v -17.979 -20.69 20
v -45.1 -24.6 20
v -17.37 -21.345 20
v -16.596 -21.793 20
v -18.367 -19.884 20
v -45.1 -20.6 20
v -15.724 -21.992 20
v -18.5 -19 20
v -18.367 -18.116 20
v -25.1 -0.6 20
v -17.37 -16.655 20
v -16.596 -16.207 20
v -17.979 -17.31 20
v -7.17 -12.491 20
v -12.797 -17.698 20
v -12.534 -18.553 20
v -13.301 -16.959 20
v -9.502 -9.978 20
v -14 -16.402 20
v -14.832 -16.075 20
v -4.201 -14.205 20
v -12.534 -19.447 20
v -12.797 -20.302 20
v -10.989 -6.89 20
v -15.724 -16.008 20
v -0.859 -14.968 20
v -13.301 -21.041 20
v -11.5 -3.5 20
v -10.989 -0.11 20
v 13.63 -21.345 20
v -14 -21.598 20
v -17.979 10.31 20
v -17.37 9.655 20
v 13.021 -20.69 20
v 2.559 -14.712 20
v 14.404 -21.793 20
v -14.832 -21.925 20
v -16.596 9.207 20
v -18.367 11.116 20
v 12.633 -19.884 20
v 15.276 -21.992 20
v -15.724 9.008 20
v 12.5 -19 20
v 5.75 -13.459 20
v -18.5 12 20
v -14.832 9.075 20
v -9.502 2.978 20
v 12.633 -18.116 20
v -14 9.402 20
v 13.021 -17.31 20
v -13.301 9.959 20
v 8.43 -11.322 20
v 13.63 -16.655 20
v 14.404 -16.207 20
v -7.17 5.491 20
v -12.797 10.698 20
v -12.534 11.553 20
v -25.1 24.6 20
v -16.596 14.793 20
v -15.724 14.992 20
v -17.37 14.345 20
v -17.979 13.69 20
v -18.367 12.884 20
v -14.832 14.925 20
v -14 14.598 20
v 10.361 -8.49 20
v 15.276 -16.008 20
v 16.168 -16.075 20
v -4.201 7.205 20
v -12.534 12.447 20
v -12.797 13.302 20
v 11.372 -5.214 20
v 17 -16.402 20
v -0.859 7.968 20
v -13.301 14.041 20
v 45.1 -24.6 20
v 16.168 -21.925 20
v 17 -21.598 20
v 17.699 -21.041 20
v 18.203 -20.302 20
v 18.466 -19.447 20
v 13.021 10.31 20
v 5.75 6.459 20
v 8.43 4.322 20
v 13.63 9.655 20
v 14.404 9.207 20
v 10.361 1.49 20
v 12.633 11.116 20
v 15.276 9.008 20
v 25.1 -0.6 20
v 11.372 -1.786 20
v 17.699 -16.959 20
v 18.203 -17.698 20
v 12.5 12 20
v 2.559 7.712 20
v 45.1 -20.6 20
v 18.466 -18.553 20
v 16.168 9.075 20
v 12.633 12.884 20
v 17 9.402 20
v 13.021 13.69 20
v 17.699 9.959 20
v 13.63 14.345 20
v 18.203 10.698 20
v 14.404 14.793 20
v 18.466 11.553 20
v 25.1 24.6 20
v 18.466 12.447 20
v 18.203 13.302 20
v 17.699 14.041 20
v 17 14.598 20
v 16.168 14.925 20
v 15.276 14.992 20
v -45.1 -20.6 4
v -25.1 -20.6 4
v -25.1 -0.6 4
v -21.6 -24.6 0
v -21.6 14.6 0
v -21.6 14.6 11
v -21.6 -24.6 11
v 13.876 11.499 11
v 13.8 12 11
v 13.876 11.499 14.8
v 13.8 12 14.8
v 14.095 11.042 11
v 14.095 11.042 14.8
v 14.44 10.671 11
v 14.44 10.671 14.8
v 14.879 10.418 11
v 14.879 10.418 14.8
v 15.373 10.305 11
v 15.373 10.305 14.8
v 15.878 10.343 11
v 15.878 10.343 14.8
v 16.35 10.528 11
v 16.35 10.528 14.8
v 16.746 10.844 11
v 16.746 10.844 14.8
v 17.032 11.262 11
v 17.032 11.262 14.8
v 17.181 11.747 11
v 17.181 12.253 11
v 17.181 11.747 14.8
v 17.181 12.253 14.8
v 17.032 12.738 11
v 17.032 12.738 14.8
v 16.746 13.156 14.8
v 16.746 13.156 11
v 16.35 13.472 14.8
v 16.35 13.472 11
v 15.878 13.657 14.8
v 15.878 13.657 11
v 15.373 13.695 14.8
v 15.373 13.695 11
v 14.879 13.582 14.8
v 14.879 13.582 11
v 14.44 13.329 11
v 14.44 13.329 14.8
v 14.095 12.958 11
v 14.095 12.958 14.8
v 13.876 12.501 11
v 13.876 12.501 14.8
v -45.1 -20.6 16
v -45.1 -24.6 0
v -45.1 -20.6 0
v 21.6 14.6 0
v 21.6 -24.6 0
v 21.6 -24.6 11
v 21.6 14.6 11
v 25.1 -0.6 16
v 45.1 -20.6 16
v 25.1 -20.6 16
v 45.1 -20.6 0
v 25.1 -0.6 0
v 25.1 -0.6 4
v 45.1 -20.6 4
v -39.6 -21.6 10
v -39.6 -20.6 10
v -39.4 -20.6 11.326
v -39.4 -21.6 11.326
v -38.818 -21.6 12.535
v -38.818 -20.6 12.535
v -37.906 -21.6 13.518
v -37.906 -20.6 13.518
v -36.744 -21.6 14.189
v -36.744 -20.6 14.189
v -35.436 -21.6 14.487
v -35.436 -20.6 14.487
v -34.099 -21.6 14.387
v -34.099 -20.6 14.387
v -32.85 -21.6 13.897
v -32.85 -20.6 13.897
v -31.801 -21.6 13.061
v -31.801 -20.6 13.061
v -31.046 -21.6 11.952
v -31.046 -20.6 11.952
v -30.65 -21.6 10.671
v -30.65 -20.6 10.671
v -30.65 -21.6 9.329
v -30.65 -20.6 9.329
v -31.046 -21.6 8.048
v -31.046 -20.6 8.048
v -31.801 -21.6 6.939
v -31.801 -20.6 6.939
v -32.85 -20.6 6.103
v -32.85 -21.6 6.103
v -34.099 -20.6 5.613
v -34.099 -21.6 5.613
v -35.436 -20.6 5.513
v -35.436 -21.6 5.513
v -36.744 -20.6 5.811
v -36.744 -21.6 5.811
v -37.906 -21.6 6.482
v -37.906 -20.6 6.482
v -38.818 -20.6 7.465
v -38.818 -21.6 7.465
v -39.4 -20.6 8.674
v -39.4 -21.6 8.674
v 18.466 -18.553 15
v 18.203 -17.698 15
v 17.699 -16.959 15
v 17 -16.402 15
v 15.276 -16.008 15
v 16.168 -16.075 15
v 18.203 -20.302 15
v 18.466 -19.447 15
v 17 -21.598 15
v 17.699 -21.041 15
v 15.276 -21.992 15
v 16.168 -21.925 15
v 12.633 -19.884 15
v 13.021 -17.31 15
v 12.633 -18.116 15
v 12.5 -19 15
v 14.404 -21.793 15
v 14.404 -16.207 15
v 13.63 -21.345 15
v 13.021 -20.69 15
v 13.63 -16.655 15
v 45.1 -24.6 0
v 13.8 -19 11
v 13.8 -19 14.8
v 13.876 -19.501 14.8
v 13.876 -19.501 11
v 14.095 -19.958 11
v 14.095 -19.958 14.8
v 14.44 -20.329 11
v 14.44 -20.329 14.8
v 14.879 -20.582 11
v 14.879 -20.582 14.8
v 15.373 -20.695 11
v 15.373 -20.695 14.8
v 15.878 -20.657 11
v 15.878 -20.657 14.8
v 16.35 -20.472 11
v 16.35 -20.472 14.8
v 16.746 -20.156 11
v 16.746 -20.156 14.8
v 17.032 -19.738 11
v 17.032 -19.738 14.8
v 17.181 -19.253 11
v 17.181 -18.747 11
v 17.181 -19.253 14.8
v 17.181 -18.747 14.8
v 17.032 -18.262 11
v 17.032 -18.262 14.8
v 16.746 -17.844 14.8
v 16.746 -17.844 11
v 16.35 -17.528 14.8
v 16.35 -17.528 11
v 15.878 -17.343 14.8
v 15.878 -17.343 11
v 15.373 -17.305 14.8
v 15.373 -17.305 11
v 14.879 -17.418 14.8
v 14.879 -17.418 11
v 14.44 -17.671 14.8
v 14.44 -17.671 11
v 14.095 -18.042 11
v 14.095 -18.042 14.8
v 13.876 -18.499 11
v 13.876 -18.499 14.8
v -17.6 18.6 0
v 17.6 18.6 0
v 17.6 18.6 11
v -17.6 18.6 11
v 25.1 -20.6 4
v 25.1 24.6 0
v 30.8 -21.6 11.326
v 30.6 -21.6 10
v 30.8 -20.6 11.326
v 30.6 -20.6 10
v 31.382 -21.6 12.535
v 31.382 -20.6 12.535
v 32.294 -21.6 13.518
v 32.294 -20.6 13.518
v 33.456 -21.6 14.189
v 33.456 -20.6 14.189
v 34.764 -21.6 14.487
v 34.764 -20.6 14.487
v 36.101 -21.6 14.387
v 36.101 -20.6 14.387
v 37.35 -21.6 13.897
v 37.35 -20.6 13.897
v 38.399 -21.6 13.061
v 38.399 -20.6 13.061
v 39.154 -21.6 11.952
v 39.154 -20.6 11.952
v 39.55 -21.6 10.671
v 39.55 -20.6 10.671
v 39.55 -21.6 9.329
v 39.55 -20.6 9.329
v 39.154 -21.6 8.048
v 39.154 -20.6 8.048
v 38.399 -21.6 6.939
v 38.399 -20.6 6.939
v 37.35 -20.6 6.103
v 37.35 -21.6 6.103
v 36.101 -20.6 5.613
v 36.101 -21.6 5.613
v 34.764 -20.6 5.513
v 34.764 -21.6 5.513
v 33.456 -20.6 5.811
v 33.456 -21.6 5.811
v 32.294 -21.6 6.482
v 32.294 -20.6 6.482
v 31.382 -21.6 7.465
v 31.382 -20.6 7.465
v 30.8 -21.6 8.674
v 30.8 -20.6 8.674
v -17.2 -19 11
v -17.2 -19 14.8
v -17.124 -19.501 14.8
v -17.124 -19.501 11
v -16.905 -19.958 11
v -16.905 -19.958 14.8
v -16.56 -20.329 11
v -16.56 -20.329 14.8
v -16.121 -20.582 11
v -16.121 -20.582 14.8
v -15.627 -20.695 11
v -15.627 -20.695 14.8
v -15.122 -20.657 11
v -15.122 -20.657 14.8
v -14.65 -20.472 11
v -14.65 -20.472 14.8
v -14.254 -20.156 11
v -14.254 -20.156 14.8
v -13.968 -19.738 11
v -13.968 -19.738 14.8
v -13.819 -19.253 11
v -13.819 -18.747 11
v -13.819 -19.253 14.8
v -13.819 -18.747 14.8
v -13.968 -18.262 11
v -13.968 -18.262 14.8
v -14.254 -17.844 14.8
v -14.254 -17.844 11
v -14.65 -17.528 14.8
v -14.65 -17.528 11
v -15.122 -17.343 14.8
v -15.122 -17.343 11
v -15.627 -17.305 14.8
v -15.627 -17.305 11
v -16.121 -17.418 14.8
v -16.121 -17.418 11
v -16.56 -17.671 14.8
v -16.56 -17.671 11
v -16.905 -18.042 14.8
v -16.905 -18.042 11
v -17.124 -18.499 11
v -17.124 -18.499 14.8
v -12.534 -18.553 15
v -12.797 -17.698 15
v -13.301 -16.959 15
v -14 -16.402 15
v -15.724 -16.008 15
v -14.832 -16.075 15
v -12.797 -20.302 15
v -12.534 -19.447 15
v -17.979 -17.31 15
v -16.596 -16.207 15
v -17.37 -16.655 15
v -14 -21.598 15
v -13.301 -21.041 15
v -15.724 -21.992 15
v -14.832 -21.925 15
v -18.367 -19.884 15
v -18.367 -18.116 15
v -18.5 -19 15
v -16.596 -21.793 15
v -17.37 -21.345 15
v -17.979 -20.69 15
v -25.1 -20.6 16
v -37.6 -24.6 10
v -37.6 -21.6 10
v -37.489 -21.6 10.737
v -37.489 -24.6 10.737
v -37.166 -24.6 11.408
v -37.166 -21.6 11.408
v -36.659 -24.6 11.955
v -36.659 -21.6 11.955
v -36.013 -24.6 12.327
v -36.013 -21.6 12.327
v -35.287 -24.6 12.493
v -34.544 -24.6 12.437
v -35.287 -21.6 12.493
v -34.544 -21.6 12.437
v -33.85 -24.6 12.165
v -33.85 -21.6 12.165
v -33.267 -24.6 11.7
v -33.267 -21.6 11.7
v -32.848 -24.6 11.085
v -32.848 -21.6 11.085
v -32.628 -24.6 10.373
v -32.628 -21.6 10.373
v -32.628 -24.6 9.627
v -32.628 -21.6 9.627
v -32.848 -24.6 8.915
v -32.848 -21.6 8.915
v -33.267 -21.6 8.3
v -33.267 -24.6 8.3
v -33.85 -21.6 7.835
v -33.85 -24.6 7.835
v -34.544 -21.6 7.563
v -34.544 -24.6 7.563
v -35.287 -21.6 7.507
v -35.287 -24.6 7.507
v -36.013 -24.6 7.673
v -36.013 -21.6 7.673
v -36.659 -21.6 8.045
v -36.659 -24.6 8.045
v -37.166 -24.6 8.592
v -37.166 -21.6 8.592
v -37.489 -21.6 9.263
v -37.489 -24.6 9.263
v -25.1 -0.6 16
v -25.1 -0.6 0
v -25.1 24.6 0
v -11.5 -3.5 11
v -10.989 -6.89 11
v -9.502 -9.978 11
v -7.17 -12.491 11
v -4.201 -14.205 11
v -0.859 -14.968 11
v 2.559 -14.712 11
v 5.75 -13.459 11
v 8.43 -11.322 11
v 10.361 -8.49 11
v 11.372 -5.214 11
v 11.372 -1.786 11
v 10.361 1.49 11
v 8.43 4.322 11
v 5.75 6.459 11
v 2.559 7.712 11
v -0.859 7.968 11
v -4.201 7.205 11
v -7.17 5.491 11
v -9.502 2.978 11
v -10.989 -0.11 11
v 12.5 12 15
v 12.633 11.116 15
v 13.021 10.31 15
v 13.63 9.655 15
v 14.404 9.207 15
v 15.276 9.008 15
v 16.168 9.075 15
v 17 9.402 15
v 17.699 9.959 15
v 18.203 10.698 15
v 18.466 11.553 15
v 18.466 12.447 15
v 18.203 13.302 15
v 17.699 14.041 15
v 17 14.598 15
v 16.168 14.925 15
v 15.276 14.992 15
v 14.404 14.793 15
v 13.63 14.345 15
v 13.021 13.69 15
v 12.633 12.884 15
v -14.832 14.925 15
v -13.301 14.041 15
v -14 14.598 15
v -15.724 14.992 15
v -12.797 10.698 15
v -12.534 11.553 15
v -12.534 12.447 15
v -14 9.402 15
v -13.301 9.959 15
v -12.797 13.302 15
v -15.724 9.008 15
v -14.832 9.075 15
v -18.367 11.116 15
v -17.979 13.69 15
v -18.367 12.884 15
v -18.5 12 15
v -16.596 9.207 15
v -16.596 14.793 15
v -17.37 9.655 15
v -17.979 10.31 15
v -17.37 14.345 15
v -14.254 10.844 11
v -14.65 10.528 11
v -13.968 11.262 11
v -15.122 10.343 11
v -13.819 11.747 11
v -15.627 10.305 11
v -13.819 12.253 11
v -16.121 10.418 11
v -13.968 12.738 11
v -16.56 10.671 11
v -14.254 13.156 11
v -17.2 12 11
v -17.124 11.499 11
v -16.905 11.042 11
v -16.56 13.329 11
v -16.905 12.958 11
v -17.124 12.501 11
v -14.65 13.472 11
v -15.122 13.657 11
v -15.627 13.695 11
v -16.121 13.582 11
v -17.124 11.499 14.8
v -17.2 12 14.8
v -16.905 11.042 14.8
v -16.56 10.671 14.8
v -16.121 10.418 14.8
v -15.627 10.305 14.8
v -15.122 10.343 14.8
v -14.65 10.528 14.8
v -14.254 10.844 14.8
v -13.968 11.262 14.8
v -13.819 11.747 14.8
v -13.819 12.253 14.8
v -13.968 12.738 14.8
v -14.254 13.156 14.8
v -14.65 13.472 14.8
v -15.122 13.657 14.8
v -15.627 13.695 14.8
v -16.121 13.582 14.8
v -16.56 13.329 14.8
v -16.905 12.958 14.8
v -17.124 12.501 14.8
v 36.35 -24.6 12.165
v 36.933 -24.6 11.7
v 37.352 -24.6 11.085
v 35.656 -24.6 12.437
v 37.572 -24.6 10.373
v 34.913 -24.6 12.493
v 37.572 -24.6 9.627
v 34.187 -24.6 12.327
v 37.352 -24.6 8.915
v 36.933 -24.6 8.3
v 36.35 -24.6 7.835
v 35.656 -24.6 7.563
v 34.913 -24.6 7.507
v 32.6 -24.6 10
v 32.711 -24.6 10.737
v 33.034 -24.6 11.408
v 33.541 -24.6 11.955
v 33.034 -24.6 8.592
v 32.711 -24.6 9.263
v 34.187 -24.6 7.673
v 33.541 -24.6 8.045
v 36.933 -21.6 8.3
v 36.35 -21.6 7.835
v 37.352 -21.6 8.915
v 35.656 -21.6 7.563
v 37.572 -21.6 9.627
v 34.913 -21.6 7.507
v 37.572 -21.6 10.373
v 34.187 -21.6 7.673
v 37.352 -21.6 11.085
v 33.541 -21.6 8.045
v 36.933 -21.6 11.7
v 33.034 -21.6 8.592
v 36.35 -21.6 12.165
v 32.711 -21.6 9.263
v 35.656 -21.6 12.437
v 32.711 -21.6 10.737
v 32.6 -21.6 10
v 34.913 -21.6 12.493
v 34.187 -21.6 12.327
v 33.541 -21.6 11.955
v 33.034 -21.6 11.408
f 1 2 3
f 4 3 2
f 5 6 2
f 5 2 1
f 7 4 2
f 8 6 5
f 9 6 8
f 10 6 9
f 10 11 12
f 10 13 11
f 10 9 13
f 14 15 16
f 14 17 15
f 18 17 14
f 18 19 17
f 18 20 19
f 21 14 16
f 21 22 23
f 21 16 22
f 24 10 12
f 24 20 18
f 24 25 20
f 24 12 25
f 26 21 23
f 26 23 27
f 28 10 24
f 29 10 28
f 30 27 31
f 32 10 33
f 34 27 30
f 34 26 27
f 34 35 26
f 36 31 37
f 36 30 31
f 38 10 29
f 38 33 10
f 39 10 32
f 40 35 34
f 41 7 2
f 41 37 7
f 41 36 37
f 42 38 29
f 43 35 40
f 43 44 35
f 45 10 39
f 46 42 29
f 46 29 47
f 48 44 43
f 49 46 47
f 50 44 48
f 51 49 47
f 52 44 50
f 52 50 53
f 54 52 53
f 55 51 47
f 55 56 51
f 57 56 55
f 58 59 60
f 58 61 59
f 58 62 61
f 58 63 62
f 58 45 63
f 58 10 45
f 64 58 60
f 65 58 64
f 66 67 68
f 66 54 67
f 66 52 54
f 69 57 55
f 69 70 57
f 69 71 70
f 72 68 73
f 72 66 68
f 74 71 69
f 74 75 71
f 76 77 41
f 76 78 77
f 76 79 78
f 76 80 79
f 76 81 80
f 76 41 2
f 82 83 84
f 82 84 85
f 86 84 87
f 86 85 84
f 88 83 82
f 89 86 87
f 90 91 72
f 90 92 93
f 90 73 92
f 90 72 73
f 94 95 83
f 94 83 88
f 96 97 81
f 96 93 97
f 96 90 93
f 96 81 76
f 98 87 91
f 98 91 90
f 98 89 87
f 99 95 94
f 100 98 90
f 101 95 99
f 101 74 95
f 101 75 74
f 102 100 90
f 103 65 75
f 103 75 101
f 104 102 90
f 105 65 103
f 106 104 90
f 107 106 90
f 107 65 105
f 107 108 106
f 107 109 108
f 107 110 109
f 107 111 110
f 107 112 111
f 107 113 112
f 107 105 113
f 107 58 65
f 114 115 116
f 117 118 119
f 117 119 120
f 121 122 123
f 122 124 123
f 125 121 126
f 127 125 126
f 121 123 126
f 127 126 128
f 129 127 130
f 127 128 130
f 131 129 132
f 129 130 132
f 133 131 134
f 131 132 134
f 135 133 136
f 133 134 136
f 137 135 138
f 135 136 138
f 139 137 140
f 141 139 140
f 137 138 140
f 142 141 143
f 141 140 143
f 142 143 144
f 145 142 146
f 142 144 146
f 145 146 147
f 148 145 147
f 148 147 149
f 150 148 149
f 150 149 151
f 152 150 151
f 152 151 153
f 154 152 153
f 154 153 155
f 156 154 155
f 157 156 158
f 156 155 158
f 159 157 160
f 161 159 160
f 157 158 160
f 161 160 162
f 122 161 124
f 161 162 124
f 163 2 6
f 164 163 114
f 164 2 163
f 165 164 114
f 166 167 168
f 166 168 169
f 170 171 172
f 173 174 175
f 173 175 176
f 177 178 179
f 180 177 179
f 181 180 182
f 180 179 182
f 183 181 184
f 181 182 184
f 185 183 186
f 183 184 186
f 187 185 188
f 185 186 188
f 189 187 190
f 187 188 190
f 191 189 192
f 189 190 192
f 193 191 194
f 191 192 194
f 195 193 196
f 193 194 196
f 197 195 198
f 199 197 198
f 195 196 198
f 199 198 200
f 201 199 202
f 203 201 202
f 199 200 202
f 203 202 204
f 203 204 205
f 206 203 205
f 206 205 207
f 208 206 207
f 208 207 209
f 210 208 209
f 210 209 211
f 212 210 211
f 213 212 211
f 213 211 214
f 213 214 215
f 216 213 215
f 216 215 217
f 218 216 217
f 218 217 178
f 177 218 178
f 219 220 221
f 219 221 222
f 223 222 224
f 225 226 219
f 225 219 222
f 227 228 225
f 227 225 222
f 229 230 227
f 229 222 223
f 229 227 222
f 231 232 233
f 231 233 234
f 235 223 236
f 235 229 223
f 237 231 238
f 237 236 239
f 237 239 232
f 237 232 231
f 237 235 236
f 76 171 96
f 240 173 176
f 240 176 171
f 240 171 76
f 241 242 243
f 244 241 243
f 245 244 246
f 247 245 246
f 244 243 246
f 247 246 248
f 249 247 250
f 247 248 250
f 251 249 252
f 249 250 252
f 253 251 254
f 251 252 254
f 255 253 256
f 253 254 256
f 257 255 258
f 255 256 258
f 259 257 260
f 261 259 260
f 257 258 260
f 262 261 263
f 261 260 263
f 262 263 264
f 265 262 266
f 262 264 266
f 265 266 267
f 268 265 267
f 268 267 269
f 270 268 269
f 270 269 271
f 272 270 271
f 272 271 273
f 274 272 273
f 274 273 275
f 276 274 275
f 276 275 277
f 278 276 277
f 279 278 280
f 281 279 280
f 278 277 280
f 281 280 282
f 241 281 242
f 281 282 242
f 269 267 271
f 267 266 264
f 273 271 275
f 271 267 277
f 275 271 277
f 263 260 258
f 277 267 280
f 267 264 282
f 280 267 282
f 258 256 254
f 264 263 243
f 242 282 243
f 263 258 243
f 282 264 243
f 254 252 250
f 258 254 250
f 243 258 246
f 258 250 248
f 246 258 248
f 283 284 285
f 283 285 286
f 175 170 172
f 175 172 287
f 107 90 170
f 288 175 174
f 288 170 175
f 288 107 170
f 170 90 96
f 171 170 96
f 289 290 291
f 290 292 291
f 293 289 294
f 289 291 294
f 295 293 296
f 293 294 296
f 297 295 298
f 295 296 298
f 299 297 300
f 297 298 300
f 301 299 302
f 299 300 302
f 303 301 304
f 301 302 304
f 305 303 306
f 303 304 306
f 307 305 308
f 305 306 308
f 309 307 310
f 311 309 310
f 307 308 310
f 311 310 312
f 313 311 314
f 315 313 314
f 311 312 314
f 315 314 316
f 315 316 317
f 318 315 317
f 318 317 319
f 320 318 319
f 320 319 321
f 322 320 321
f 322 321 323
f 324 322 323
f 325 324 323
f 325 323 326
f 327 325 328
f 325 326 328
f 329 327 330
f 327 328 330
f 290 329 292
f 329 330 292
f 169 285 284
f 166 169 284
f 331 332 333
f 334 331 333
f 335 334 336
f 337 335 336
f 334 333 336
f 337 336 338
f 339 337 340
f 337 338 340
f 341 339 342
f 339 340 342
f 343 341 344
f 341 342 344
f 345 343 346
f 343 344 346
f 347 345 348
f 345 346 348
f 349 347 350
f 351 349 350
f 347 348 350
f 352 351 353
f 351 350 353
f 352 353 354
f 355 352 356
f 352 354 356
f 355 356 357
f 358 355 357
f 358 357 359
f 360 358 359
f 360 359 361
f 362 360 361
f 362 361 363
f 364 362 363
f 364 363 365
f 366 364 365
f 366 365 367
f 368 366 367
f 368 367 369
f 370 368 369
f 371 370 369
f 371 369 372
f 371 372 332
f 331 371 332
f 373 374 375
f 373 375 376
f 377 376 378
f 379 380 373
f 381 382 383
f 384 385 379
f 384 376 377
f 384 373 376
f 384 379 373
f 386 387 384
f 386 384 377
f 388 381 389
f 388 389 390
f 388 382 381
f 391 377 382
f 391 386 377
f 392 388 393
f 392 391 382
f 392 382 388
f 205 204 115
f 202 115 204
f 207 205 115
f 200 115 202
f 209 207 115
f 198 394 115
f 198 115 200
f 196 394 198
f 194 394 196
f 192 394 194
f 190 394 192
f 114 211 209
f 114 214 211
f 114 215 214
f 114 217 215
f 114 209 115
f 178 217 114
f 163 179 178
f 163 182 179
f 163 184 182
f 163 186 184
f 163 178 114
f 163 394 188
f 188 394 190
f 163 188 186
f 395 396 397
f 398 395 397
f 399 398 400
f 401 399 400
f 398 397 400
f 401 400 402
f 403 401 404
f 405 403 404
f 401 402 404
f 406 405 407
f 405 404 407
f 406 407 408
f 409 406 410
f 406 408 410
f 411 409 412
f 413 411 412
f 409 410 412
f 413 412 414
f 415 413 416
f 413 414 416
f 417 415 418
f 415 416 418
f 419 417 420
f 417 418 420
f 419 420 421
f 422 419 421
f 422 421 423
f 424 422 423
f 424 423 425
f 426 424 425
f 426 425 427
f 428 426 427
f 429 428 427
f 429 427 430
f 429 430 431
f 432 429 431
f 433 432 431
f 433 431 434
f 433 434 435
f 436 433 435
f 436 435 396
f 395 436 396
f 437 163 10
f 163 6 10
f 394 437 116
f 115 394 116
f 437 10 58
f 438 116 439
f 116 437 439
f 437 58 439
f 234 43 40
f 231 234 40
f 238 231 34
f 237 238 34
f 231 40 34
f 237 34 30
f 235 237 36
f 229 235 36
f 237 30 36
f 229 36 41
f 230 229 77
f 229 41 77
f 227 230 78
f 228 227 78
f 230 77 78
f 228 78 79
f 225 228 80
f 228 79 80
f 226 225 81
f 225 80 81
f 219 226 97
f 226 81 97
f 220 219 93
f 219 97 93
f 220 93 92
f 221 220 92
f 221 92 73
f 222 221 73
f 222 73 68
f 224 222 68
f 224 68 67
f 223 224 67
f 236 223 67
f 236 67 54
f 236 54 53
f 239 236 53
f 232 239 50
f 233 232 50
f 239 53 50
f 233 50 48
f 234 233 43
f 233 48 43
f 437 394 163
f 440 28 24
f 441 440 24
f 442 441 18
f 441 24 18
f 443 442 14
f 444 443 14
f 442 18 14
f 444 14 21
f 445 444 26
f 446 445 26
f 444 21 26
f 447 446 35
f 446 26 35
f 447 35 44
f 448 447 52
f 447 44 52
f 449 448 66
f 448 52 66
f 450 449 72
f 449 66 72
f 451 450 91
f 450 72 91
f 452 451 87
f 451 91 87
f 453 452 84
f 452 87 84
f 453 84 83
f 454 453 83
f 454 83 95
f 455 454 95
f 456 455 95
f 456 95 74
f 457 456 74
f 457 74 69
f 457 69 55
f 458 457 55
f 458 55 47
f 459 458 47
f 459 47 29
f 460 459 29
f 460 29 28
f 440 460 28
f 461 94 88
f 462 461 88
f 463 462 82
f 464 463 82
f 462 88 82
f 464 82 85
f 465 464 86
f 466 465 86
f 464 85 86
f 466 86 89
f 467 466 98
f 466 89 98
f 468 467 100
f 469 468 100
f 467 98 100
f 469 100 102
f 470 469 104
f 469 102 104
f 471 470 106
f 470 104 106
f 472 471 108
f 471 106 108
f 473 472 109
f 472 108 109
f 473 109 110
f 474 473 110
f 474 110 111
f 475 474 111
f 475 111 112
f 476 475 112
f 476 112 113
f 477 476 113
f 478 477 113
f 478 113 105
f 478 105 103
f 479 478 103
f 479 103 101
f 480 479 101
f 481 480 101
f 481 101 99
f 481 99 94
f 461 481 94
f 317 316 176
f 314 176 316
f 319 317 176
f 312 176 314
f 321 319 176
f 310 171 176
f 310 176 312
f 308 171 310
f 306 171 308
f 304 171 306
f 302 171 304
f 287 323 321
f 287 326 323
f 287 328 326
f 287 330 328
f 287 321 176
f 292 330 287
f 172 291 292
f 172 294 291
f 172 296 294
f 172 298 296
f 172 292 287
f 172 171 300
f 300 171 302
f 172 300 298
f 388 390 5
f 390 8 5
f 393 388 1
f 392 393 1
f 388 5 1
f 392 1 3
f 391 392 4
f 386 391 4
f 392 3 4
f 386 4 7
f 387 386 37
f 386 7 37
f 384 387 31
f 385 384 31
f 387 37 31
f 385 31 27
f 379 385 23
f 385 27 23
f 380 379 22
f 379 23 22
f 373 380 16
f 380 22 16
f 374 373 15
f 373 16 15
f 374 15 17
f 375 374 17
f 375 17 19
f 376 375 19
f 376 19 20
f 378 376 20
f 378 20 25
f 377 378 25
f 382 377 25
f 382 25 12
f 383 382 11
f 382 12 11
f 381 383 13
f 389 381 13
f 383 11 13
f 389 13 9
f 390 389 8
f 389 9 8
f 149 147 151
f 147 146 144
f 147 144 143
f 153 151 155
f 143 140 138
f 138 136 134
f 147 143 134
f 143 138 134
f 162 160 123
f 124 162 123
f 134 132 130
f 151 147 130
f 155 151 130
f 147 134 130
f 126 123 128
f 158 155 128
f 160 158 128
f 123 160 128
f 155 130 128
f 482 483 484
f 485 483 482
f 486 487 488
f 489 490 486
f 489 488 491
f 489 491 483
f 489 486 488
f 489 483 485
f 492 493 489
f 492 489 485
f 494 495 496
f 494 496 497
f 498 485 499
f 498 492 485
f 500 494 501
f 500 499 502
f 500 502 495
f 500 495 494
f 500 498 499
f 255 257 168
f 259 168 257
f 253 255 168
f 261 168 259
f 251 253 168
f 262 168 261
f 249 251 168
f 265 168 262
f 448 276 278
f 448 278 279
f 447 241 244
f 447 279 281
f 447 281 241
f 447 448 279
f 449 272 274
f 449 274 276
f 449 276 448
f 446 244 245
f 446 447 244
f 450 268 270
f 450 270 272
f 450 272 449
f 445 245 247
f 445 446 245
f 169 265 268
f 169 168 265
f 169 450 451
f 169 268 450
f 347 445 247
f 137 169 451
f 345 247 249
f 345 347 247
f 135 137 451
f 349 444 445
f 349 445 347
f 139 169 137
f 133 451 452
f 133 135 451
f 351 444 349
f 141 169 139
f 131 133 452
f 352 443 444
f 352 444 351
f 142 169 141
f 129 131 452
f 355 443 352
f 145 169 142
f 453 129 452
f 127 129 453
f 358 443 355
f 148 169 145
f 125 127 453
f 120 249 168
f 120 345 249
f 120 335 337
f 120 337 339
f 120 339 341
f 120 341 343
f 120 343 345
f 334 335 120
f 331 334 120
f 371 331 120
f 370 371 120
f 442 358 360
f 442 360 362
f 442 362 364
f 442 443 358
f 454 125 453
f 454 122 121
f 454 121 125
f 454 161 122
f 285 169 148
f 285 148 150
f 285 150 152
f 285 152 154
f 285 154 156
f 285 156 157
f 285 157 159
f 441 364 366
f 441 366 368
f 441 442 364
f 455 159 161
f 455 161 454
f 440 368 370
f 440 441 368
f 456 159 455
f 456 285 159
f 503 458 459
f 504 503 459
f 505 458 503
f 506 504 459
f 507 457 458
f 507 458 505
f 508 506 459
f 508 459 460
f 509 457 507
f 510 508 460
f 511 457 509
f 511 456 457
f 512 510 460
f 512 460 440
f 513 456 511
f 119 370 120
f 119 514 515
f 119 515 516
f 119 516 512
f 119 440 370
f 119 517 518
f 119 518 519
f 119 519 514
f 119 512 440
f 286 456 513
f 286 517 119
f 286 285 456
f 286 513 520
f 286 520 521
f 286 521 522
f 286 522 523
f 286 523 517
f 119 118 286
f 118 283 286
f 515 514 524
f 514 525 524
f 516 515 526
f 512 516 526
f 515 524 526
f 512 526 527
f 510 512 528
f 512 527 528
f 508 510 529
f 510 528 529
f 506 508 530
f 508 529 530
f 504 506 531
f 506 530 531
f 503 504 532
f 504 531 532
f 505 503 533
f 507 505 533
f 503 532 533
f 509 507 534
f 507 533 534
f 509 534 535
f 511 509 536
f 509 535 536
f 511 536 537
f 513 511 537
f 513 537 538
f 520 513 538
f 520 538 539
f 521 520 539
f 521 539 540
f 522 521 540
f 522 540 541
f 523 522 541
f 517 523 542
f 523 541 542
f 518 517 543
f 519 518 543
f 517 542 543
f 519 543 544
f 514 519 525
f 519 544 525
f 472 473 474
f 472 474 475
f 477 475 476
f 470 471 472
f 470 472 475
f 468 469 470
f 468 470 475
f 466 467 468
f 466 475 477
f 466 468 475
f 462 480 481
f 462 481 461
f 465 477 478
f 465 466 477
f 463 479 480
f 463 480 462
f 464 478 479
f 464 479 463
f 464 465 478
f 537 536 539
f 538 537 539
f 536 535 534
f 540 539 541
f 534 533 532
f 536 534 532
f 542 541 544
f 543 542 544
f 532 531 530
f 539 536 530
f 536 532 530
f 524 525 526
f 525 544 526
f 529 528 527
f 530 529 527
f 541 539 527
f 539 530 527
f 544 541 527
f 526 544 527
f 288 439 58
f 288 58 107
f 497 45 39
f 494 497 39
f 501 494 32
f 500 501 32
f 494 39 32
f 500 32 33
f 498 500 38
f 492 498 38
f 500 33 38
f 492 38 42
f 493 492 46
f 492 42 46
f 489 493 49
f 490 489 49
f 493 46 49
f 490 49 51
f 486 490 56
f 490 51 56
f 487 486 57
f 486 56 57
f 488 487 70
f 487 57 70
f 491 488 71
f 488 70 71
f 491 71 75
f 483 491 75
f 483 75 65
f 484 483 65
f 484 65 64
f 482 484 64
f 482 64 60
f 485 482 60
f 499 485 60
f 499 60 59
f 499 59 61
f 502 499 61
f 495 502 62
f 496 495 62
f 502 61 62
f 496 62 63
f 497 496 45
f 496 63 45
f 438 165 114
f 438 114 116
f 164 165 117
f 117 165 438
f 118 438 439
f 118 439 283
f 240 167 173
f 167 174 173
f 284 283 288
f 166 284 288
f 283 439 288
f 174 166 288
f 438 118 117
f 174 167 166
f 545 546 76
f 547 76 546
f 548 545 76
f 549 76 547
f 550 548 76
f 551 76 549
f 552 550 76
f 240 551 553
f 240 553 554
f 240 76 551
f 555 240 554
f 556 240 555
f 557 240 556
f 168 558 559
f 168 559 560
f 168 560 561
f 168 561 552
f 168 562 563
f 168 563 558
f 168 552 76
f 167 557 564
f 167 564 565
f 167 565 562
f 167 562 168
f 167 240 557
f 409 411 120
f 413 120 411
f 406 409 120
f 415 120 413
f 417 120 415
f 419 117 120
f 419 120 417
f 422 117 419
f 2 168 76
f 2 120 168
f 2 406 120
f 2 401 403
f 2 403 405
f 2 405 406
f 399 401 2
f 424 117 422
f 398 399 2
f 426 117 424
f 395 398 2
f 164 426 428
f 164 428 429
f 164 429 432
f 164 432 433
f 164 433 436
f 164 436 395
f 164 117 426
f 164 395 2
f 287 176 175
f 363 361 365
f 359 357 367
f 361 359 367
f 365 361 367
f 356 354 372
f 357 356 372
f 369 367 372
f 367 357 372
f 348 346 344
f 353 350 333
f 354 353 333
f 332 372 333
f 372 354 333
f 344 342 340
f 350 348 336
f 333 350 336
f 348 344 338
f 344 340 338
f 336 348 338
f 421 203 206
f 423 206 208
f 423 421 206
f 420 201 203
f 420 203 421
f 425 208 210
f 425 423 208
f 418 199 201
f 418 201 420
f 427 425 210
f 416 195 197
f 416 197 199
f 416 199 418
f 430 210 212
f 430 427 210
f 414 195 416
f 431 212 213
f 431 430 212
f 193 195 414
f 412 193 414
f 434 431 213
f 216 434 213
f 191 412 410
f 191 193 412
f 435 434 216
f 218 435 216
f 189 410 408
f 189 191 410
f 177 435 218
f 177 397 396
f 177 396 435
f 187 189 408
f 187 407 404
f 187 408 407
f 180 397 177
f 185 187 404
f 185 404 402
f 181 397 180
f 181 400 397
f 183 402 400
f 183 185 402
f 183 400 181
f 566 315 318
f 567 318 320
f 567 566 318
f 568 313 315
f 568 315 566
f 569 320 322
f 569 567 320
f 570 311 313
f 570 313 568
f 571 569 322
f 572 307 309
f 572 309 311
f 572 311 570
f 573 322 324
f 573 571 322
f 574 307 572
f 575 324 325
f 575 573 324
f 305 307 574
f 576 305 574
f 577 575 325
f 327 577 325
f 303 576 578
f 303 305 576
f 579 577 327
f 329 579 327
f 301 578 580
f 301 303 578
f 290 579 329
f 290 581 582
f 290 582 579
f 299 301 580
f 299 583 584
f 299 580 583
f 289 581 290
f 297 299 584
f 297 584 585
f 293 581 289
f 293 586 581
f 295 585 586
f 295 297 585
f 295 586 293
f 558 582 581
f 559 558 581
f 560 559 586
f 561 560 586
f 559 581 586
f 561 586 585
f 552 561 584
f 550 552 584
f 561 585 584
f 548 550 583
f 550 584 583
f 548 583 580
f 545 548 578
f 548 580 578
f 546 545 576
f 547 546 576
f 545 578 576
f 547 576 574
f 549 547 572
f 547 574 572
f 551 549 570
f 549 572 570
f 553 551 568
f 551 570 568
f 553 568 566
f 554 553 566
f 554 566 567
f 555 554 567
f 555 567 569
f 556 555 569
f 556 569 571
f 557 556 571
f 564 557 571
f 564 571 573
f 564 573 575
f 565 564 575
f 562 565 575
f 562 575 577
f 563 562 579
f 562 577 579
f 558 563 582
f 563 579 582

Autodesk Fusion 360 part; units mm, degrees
sketch "Sketch1" plane through (0, 0, 0) normal (0, 0, 1) x (1, 0, 0)
  line L0 (45.1, -24.6) -> (-45.1, -24.6)
  line L1 (-45.1, -24.6) -> (-45.1, 24.6)
  line L2 (-45.1, 24.6) -> (45.1, 24.6)
  line L3 (45.1, 24.6) -> (45.1, -24.6)
  line L4 (45.1, -24.6) -> (-45.1, 24.6) construction
  line L5 (-45.1, -24.6) -> (45.1, 24.6) construction
  dimension "d1" = 90.2
  dimension "d2" = 49.2
extrude "Extrude1" add sketch "Sketch1" along normal blind 20
sketch "Sketch2" plane through (0, 0, 0) normal (0, 0, -1) x (-1, 0, 0)
  line L0 (40.1, -22.1) -> (40.1, 22.1)
  line L1 (40.1, 22.1) -> (-40.1, 22.1)
  line L2 (-40.1, 22.1) -> (-40.1, -22.1)
  line L3 (21.6, -24.6) -> (-21.6, -24.6)
  line L4 (-21.6, -24.6) -> (-21.6, 18.6)
  line L5 (-21.6, 18.6) -> (21.6, 18.6)
  line L6 (21.6, 18.6) -> (21.6, -24.6)
  line L7 (45.1, 24.6) -> (-45.1, 24.6)
  line L8 (-45.1, 24.6) -> (-45.1, -24.6)
  line L9 (-45.1, -24.6) -> (45.1, -24.6)
  line L10 (45.1, -24.6) -> (45.1, 24.6)
  dimension "d5" = 43.2
  dimension "d6" = 43.2
  dimension "d73" = 21.6
extrude "Extrude2" cut sketch "Sketch2" against normal blind 11 contours L3 L4 L5 L6 L9
sketch "Sketch3" plane through (0, 24.6, 0) normal (0, 1, 0) x (-1, 0, 0)
  line L0 (-45.1, 0) -> (45.1, 0)
  line L1 (45.1, 0) -> (45.1, 20)
  line L2 (45.1, 20) -> (-45.1, 20)
  line L3 (-45.1, 20) -> (-45.1, 0)
  line L4 (-45.1, 20) -> (-25.1, 20)
  line L5 (-25.1, 20) -> (-25.1, 0)
  line L6 (-25.1, 0) -> (-45.1, 0)
  line L7 (-45.1, 0) -> (-45.1, 20)
  line L8 (45.1, 20) -> (25.1, 20)
  line L9 (25.1, 20) -> (25.1, 0)
  line L10 (25.1, 0) -> (45.1, 0)
  line L11 (45.1, 0) -> (45.1, 20)
  dimension "d9" = 20
  dimension "d10" = 20
extrude "Extrude3" cut sketch "Sketch3" against normal blind 45.2 contours L0 L2 L3 L4 L5 L6 L7 | L0 L1 L2 L8 L9 L10 L11
sketch "Sketch4" plane through (0, 0, 20) normal (0, 0, 1) x (-1, 0, 0)
  line L0 (25.1, -24.6) -> (25.1, 20.6)
  line L1 (25.1, 20.6) -> (45.1, 20.6)
  line L2 (45.1, 20.6) -> (45.1, 24.6)
  line L3 (45.1, 24.6) -> (-45.1, 24.6)
  line L4 (-45.1, 24.6) -> (-45.1, 20.6)
  line L5 (-45.1, 20.6) -> (-25.1, 20.6)
  line L6 (-25.1, 20.6) -> (-25.1, -24.6)
  line L7 (-25.1, -24.6) -> (25.1, -24.6)
  line L8 (25.1, 19) -> (-25.1, 19) construction
  line L9 (25.1, -12) -> (-25.1, -12) construction
  line L10 (15.5, -24.6) -> (15.5, 19) construction
  line L11 (-15.5, -24.6) -> (-15.5, 19) construction
  line L12 (15.5, -12) -> (15.5, -15) construction
  line L13 (15.5, -12) -> (15.5, -15) construction
  line L14 (0, -24.6) -> (0, 24.6) construction
  line L15 (-25.1, 3.5) -> (25.1, 3.5) construction
  circle A0 centre (15.5, -12) radius 1.7
  circle A1 centre (15.5, -12) radius 3
  circle A2 centre (-15.5, -12) radius 1.7
  circle A3 centre (-15.5, -12) radius 3
  circle A4 centre (-15.5, 19) radius 3
  circle A5 centre (-15.5, 19) radius 1.7
  circle A6 centre (15.5, 19) radius 3
  circle A7 centre (15.5, 19) radius 1.7
  dimension "d59" = 9.6
  dimension "d60" = 9.6
  dimension "d68" = 3.4
  dimension "d69" = 6
  dimension "d70" = 31
  dimension "d71" = 15.5
extrude "Extrude5" cut sketch "Sketch4" against normal blind 5 contours A0 | A1 | A2 | A3 | A4 | A5 | A6 | A7
extrude "Extrude4" cut sketch "Sketch4" against normal blind 9 from surface at -5.2 contours A0 | A2 | A5 | A7
sketch "Sketch5" plane through (0, -20.6, 0) normal (0, 1, 0) x (-1, 0, 0)
  line L0 (-45.1, 20) -> (-45.1, 0)
  line L1 (-45.1, 0) -> (-25.1, 0)
  line L2 (-25.1, 0) -> (-25.1, 20)
  line L3 (-25.1, 20) -> (-45.1, 0) construction
  line L4 (-45.1, 20) -> (-25.1, 0) construction
  circle A0 centre (-35.1, 10) radius 2.5
  circle A1 centre (-35.1, 10) radius 4.5
  line L5 (-25.1, 20) -> (-45.1, 20)
  dimension "d33" = 5
  dimension "d34" = 9
extrude "Extrude8" cut sketch "Sketch5" against normal blind 1 contours A0 | A1
extrude "Extrude7" cut sketch "Sketch5" against normal blind 4 contours A0
sketch "Sketch6" plane through (0, -20.6, 0) normal (0, 1, 0) x (-1, 0, 0)
  line L0 (45.1, 0) -> (45.1, 20)
  line L1 (25.1, 20) -> (25.1, 0)
  line L2 (25.1, 0) -> (45.1, 0)
  line L3 (25.1, 0) -> (45.1, 20) construction
  line L4 (25.1, 20) -> (45.1, 0) construction
  circle A0 centre (35.1, 10) radius 2.5
  circle A1 centre (35.1, 10) radius 4.5
  line L5 (45.1, 20) -> (25.1, 20)
  dimension "d39" = 5
  dimension "d40" = 9
extrude "Extrude10" cut sketch "Sketch6" against normal blind 1 contours A0 | A1
extrude "Extrude9" cut sketch "Sketch6" against normal blind 4 contours A0
sketch "Sketch7" plane through (0, 0, 20) normal (0, 0, 1) x (-1, 0, 0)
  line L0 (25.1, -24.6) -> (25.1, 20.6)
  line L1 (25.1, 20.6) -> (45.1, 20.6)
  line L2 (45.1, 20.6) -> (45.1, 24.6)
  line L3 (45.1, 24.6) -> (-45.1, 24.6)
  line L4 (-45.1, 24.6) -> (-45.1, 20.6)
  line L5 (-45.1, 20.6) -> (-25.1, 20.6)
  line L6 (-25.1, 20.6) -> (-25.1, -24.6)
  line L7 (-25.1, -24.6) -> (25.1, -24.6)
  line L8 (-25.1, 0.6) -> (25.1, 0.6) construction
  line L9 (45.1, 24.6) -> (-45.1, 24.6) construction
  line L10 (45.1, 20.6) -> (25.1, 0.6)
  line L11 (-25.1, 0.6) -> (-45.1, 20.6)
  line L12 (15.5, -12) -> (-15.5, 19) construction
  line L13 (15.5, 19) -> (-15.5, -12) construction
  line L14 (25.1, 2) -> (-25.1, 2) construction
  line L15 (-25.1, 0.5) -> (25.1, 0.5) construction
  line L16 (25.1, 3.5) -> (-25.1, 3.5) construction
  line L17 (0, 3.5) -> (0, 3.5473) construction
  circle A0 centre (15.5, -12) radius 3
  circle A1 centre (-15.5, 19) radius 3
  circle A2 centre (15.5, 19) radius 3
  circle A3 centre (-15.5, -12) radius 3
  circle A4 centre (0, 3.5) radius 11.5
  dimension "d50" = 24
  dimension "d64" = 22.6
  dimension "d65" = 1.5
  dimension "d66" = 1.5
  dimension "d74" = 23
extrude "Extrude13" cut sketch "Sketch7" against normal blind 9 contours A4
extrude "Extrude11" add sketch "Sketch7" against normal blind 4 contours L0 L1 L10 | L5 L6 L11
extrude "Extrude12" add sketch "Sketch7" along normal blind 4 from surface at -20 contours L0 L1 L10 | L5 L6 L11
chamfer "Chamfer1" distance 4 angle 45 2 edges at (21.6, 18.6, 5.5) (-21.6, 18.6, 5.5)
equation "d71 = d70 / 2"
equation "d73 = d5 / 2"
